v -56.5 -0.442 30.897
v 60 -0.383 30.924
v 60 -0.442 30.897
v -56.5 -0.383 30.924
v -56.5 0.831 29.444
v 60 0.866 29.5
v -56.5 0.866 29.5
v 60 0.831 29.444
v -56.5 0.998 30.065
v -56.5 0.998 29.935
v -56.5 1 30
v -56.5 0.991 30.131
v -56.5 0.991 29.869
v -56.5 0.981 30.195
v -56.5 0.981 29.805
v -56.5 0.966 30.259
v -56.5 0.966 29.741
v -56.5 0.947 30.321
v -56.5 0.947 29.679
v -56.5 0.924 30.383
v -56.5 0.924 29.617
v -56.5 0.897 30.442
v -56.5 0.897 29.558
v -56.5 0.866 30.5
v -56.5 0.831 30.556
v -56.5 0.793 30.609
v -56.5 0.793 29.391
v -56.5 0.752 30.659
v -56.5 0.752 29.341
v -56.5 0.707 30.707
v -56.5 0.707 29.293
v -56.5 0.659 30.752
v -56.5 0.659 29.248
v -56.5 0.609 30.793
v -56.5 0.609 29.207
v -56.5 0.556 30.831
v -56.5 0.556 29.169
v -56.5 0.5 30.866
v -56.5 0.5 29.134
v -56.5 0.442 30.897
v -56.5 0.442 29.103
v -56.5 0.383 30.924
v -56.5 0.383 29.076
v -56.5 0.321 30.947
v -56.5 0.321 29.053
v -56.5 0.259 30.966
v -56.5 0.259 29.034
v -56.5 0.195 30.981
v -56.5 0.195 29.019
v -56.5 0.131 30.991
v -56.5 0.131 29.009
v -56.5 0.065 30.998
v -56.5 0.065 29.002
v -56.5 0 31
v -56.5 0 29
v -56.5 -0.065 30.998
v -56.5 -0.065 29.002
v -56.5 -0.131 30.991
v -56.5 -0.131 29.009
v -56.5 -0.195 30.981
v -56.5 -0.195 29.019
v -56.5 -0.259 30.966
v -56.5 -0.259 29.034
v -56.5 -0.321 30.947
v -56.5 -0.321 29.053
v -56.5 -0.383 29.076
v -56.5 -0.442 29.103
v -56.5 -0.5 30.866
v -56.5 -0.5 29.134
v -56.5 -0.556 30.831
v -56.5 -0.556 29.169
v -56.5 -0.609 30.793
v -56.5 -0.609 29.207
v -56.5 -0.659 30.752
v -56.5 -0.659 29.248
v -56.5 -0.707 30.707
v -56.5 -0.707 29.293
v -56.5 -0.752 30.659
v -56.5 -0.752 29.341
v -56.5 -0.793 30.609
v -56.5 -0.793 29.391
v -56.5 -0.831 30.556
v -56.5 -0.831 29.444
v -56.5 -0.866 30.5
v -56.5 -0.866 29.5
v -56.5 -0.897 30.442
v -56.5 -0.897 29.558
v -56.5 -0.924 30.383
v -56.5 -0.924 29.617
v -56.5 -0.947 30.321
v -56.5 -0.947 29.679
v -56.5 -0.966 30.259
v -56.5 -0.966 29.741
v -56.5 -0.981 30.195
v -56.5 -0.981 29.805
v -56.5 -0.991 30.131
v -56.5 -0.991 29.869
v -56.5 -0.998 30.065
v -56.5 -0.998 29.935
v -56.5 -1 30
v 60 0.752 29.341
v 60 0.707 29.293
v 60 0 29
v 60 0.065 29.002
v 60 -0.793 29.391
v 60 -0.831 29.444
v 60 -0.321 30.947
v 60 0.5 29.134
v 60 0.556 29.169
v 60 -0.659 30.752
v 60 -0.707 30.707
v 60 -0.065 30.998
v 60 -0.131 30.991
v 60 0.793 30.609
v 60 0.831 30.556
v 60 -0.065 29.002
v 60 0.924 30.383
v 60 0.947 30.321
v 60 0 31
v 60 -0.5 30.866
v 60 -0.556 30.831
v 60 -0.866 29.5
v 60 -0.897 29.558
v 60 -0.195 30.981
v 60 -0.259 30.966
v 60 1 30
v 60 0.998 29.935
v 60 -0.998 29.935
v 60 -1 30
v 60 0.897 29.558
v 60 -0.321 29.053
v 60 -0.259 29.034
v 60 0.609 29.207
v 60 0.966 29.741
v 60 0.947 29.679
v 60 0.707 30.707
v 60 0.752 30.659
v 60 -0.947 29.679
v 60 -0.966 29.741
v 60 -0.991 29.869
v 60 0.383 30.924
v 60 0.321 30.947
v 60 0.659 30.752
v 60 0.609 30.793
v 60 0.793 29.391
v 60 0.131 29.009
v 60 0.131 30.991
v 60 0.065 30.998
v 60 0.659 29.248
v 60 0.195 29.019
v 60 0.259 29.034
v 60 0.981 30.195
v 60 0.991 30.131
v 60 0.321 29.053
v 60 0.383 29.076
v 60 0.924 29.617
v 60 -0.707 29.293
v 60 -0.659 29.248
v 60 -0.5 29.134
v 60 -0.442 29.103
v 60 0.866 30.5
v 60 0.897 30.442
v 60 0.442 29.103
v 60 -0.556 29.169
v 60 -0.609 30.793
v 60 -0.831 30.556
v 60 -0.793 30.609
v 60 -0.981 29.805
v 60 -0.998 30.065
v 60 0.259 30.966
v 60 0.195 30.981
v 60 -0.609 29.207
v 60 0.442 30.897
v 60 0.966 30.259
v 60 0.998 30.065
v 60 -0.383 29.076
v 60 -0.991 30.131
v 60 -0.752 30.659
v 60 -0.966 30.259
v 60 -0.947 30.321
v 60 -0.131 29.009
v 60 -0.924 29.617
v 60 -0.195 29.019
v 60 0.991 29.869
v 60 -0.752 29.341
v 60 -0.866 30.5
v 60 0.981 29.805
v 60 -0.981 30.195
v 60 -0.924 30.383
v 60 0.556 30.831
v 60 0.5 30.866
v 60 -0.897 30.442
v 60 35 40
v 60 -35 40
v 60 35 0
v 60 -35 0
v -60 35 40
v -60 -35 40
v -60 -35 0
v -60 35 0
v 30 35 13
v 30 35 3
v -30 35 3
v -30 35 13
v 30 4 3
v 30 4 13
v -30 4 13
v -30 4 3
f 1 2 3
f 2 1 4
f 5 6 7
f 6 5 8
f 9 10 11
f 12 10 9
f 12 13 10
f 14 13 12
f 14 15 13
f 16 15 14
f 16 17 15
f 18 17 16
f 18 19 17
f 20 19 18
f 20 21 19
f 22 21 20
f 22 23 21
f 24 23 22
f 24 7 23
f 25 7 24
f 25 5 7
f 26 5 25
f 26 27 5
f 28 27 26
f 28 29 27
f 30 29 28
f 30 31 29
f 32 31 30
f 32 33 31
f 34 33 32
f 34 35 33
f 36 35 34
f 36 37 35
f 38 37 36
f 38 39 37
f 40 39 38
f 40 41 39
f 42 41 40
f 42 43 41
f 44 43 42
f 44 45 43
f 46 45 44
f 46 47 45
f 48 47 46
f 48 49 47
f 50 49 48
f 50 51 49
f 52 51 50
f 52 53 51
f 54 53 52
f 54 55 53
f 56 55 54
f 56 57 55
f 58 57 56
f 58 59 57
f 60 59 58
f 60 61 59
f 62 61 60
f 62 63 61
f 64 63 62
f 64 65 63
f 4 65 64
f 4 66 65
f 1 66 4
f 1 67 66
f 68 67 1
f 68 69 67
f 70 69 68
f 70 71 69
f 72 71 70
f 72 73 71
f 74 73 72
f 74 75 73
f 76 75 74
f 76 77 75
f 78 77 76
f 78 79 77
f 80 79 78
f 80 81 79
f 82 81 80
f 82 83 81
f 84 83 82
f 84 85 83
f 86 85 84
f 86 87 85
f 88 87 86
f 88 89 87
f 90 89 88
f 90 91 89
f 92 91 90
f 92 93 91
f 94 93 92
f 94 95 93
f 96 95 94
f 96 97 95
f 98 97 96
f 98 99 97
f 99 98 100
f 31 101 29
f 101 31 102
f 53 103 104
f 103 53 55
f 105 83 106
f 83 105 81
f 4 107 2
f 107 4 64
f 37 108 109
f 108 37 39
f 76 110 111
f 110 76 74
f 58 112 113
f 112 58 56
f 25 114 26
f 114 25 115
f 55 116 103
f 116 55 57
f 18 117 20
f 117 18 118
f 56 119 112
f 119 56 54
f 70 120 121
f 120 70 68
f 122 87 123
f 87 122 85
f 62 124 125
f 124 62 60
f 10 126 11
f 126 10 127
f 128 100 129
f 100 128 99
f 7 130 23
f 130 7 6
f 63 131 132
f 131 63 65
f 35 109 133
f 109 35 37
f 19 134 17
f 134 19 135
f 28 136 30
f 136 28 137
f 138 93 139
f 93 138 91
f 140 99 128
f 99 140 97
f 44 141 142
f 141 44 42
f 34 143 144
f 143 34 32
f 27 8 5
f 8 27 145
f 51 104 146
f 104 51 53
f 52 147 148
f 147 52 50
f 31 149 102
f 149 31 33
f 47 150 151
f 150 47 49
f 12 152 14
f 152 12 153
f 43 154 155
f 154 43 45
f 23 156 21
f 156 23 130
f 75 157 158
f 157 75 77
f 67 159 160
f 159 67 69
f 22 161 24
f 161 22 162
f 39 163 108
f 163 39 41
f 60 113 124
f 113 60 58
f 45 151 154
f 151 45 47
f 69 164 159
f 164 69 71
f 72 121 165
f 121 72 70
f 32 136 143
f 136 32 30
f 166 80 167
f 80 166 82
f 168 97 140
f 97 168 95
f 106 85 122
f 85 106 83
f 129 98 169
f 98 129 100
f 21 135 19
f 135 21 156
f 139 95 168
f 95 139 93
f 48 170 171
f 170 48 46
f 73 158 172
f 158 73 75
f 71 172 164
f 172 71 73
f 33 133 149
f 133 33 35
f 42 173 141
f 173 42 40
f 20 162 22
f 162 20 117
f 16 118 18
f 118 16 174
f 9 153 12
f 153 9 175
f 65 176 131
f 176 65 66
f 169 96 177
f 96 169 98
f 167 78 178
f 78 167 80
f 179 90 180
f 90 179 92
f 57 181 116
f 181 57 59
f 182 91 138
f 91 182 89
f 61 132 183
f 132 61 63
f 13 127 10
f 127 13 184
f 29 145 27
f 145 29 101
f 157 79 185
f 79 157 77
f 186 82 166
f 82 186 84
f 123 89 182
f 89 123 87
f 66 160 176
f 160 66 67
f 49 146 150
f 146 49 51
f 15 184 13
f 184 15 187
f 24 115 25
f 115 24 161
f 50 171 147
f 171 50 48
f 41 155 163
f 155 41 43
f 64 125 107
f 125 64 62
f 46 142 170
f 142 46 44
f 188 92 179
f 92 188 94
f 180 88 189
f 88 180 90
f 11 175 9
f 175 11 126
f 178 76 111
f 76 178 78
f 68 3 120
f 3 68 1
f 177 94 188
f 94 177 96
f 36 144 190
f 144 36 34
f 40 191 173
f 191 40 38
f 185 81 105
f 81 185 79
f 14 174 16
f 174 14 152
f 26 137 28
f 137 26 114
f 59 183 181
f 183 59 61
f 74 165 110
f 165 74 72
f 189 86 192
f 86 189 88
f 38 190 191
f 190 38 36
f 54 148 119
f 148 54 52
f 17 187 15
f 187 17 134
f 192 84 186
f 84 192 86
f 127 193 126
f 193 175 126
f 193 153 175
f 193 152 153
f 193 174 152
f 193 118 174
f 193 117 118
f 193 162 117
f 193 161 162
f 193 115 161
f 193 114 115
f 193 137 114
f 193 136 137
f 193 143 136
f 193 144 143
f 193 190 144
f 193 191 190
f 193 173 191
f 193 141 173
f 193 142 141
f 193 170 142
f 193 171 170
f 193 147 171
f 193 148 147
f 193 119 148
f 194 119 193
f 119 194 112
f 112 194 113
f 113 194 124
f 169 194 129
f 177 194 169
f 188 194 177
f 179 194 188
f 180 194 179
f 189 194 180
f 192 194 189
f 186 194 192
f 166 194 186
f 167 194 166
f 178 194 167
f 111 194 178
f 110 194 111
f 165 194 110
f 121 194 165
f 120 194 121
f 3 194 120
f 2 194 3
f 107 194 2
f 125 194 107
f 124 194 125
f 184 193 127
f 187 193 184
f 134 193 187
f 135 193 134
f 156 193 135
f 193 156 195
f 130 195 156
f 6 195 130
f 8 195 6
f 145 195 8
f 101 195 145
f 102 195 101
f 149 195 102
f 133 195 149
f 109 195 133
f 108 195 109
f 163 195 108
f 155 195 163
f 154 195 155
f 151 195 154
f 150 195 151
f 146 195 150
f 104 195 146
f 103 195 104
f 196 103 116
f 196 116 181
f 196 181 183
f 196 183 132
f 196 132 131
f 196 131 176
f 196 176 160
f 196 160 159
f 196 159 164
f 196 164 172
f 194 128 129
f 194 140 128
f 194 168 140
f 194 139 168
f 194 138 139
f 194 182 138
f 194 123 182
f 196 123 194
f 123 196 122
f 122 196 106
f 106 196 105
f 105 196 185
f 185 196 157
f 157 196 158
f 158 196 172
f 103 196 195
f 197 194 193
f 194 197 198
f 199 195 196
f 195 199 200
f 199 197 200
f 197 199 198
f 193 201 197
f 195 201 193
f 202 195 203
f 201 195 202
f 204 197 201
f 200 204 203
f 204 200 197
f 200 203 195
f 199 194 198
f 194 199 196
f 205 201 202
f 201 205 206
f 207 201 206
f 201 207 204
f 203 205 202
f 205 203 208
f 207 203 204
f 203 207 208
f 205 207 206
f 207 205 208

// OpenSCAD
// Mini horizontal gel-electrophoresis buffer tank
// Print orientation: tank rests on XY plane at z = 0, builds upward (+Z)

// ---------------- Parameters ----------------
tank_x      = 120;   // outer length in X (mm)
tank_y      = 70;    // outer width in Y (mm)
tank_z      = 40;    // outer height in Z (mm)
wall        = 3;     // wall thickness (mm)
floor       = 3;     // floor thickness (mm)

platform_x  = 60;    // platform length in X (mm), centred
platform_y  = tank_y - 2 * wall;  // platform spans full inner width (mm)
platform_z  = floor + 10;          // platform top height (mm) = 13

hole_d      = 2;     // electrode hole diameter (mm)
hole_y      = 0;     // hole Y position (mm)
hole_z      = 30;    // hole Z position (mm)

eps         = 0.5;   // cutter overshoot past faces (mm)
$fn         = 96;    // curve resolution

// ---------------- Derived ----------------
inner_x = tank_x - 2 * wall;   // 114 mm
inner_y = tank_y - 2 * wall;   // 64 mm
inner_z = tank_z - wall;       // 37 mm (open top)

// ---------------- Model ----------------
difference() {
    // Tank body: hollow rectangular box, open top
    translate([-tank_x / 2, -tank_y / 2, 0])
        cube([tank_x, tank_y, tank_z]);

    // Gel-tray platform: solid block, centred in X, full inner width
    translate([-platform_x / 2, wall + 1, floor])
        cube([platform_x, platform_y, platform_z - floor]);

    // Electrode holes: horizontal through each end wall along X
    for (sx = [-1, 1])
        translate([sx * (inner_x / 2 - eps), hole_y, hole_z])
            rotate([0, 90, 0])
                cylinder(d = hole_d, h = tank_x + 2 * eps);
}
